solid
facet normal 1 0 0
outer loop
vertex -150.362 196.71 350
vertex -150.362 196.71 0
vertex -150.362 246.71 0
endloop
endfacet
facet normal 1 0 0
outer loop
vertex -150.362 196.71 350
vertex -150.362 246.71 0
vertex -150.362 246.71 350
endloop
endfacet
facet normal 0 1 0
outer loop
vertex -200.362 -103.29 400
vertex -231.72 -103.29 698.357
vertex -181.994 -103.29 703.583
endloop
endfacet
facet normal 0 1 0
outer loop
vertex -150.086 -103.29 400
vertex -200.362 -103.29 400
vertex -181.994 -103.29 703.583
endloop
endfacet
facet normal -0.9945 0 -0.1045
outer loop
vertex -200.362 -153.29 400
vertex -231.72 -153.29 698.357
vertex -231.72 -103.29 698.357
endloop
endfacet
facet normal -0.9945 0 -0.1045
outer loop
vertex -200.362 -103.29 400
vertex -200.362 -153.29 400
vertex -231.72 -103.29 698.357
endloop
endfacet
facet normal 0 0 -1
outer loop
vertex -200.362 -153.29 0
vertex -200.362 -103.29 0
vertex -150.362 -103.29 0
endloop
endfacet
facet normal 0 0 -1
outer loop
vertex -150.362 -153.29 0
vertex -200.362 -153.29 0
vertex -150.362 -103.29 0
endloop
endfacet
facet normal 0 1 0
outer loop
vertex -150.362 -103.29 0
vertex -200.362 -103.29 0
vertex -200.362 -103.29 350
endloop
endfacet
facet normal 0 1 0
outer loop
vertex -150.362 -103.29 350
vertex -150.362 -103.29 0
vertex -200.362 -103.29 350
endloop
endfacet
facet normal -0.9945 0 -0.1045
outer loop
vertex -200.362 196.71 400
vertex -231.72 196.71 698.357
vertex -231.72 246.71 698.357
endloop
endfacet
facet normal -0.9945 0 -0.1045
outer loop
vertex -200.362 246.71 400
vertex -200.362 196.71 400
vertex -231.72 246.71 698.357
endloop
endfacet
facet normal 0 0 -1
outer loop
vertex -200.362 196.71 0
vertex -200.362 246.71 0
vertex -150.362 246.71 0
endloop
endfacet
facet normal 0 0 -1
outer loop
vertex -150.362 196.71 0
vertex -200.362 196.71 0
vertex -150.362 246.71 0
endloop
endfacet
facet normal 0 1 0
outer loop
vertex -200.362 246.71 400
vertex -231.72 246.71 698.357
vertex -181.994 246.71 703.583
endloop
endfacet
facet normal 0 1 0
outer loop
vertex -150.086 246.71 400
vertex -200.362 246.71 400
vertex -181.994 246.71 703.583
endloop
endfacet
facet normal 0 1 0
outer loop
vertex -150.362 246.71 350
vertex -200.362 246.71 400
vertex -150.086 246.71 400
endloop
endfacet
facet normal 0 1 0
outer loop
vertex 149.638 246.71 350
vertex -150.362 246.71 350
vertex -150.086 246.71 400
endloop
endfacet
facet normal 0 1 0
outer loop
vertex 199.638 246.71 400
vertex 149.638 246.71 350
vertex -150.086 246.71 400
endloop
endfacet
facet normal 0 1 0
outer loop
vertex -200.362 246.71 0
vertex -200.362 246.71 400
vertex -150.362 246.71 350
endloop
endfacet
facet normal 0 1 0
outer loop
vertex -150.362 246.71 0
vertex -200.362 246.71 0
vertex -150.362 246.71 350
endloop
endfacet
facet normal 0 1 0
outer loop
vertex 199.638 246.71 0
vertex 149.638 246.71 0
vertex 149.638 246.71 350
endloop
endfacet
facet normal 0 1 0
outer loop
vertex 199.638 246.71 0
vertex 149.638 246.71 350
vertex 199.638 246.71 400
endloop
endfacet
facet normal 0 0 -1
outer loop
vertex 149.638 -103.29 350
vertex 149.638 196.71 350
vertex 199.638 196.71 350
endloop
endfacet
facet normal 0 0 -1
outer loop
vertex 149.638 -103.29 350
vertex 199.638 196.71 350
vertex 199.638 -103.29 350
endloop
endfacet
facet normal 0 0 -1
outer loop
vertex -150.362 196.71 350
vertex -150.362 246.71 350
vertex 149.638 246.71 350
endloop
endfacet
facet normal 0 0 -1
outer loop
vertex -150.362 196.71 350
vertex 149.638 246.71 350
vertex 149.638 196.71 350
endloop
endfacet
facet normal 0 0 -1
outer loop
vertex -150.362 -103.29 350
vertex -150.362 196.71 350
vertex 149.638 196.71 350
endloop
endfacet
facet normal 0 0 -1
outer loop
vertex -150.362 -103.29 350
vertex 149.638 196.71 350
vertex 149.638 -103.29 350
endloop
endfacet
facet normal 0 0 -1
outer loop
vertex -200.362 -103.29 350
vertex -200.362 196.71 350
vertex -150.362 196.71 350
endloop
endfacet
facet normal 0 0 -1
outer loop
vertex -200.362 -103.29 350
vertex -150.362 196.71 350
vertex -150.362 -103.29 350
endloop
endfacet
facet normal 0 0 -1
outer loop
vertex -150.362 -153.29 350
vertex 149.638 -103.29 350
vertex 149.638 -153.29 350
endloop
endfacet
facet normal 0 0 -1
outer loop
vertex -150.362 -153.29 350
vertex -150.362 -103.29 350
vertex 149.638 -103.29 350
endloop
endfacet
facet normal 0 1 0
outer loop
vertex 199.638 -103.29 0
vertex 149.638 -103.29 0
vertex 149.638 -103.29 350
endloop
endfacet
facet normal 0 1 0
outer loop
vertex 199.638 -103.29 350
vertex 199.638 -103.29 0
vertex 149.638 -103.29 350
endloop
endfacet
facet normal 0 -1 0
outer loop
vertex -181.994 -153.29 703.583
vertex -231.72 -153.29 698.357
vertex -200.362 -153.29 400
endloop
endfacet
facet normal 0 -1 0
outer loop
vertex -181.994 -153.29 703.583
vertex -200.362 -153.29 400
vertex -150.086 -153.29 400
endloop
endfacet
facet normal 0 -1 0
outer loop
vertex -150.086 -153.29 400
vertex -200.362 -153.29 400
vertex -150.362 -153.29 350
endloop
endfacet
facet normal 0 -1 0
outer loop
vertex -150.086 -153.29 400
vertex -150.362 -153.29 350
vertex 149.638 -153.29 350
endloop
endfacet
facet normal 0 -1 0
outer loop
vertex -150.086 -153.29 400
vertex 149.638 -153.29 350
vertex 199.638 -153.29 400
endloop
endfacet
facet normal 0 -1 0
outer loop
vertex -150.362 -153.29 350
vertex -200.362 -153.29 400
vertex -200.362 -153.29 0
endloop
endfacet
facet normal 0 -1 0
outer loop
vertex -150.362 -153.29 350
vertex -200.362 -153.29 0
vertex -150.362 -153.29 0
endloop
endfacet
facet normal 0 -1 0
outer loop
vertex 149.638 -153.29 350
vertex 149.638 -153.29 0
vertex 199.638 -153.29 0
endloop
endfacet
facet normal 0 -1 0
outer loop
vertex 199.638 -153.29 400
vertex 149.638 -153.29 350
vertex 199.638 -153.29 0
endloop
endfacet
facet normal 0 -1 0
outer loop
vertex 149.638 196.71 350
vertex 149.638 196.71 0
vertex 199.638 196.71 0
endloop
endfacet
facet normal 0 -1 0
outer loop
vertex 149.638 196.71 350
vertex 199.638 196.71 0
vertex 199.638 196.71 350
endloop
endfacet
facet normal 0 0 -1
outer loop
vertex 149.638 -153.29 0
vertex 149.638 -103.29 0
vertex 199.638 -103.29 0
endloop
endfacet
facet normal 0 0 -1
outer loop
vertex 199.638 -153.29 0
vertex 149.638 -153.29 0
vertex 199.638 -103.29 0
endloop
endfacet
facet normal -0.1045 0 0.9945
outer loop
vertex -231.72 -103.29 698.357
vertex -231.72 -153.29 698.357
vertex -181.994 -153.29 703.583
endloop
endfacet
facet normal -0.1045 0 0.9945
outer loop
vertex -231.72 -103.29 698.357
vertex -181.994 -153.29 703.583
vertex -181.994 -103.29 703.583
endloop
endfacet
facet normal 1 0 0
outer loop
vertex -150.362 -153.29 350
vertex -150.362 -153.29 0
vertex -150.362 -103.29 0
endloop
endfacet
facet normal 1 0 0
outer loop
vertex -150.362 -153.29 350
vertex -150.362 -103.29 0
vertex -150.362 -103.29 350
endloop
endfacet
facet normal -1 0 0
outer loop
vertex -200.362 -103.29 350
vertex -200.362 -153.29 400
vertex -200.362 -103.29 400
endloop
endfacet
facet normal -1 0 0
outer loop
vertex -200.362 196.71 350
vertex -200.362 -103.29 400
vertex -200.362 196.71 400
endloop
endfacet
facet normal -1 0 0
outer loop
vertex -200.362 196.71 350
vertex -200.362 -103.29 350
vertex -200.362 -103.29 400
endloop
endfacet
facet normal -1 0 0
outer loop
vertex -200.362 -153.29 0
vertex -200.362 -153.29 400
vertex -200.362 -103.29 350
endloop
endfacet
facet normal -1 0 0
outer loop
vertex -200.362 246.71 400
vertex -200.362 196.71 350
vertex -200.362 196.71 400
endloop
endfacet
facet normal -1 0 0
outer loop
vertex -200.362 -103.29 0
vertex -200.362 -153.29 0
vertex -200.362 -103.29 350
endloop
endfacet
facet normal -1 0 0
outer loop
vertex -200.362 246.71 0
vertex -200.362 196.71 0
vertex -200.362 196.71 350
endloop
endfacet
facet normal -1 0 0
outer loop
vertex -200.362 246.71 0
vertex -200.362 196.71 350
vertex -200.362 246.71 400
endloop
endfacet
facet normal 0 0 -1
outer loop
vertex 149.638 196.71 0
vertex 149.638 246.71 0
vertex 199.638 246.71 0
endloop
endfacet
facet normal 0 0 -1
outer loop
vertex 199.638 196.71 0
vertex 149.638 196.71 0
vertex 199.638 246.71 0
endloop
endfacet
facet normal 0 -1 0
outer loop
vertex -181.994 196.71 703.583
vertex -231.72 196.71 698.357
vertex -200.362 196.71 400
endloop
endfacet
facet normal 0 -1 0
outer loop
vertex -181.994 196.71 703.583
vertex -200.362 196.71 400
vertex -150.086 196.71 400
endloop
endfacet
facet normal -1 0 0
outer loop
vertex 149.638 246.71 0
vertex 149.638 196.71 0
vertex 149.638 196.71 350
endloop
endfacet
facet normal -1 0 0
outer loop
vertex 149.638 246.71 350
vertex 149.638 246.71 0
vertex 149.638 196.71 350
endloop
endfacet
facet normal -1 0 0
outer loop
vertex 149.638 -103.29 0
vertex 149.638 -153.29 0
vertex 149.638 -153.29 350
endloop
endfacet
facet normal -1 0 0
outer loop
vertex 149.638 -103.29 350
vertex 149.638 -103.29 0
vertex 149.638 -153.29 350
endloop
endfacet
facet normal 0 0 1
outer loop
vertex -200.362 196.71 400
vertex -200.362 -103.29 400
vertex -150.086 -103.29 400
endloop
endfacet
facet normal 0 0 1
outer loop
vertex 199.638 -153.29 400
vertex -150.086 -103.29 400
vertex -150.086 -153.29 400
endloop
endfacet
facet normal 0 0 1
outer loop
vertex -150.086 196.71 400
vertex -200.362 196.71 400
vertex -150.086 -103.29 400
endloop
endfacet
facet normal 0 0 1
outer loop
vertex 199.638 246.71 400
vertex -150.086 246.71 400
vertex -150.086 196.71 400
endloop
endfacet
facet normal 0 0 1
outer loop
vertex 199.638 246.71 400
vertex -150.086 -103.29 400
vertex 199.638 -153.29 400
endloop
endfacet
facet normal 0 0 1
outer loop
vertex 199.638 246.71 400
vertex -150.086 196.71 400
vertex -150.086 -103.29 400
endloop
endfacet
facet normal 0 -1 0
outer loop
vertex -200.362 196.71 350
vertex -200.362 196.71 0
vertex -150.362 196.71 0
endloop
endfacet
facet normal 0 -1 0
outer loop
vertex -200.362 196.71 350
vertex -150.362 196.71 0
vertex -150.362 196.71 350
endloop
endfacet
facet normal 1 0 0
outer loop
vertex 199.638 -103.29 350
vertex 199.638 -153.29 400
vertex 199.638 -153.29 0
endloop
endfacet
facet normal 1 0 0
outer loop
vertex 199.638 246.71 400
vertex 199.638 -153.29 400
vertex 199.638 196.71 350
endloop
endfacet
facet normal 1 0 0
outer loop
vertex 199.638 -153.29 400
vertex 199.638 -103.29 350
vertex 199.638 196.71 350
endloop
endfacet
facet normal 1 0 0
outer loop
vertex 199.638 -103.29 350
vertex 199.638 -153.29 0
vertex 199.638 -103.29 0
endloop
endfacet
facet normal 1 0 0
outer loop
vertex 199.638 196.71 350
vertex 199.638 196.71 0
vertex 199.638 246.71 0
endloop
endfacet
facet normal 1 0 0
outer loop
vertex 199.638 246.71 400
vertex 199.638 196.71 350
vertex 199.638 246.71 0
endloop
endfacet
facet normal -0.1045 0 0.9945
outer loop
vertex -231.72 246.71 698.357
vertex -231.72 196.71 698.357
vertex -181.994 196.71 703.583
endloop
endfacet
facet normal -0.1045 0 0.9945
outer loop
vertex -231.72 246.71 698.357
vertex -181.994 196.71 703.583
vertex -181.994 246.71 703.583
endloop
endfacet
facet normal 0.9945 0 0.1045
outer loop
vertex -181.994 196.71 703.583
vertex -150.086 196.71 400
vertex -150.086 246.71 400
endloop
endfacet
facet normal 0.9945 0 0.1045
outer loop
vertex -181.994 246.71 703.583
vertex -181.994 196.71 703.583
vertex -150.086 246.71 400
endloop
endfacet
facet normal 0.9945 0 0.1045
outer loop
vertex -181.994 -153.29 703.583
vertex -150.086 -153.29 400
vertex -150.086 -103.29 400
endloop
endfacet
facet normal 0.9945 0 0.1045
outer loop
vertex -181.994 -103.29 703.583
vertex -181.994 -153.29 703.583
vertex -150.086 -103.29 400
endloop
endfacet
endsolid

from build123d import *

# Parameters (mm, degrees)
F0_W      = 400
F0_H      = 400
F1_DEPTH  = 400
F2_W      = 300
F2_H      = 350
F3_DEPTH  = 400
F4_W      = 300
F4_H      = 350
F5_DEPTH  = 400
F6_W      = 50
F6_H      = 400
F7_DEPTH  = 300
F8_W      = 300
F8_H      = 300
F9_DEPTH  = 50
F10_DEPTH = 300
F11_DEPTH = 300
F15_W     = 50
F15_H     = 300
F16_DEPTH = 50
F17_DEPTH = 25
F18_W     = 50
F18_H     = 300
F19_DEPTH = 50
F20_DEPTH = 5.2552117633


with BuildPart() as f1:
    # F0 (on Top) → F1 (new body)
    with BuildSketch(Plane.XY):
        with Locations((-0.3617890179, 46.7100545251)):
            Rectangle(F0_W, F0_H)
    extrude(amount=F1_DEPTH)

    # F2 (on face) → F3 (cut)
    with BuildSketch(Plane(origin=(-200.3617890179, 0, 0), x_dir=(0, -1, 0), z_dir=(-1, 0, 0))):
        with Locations((-46.7100545251, 175)):
            Rectangle(F2_W, F2_H)
    extrude(amount=-F3_DEPTH, mode=Mode.SUBTRACT)

    # F4 (on face) → F5 (cut)
    with BuildSketch(Plane.XZ.offset(153.2899454749)):
        with Locations((-0.3617890179, 175)):
            Rectangle(F4_W, F4_H)
    extrude(amount=-F5_DEPTH, mode=Mode.SUBTRACT)

    # F6 (on face) → F7 (join)
    with BuildSketch(Plane.XY.offset(400)):
        with Locations((-175.3617890179, 46.7100545251)):
            Rectangle(F6_W, F6_H)
    extrude(amount=F7_DEPTH)

    # F8 (on face) → F9 (cut)
    with BuildSketch(Plane.YZ.offset(-150.3617890179)):
        with Locations((46.7100545251, 550)):
            Rectangle(F8_W, F8_H)
    extrude(amount=-F9_DEPTH, mode=Mode.SUBTRACT)

    # F10 (cut): a face of the model
    f10_faces = [f1.faces().sort_by_distance(p)[0] for p in [
        (-175.3617890179, -128.2899454749, 700),
    ]]
    extrude(f10_faces, amount=-F10_DEPTH, mode=Mode.SUBTRACT)

    # F11 (cut): a face of the model
    f11_faces = [f1.faces().sort_by_distance(p)[0] for p in [
        (-175.3617890179, 221.7100545251, 700),
    ]]
    extrude(f11_faces, amount=-F11_DEPTH, mode=Mode.SUBTRACT)

    # F15 (on face) → F16 (join)
    with BuildSketch(Plane(origin=(-156.5902579487, 0, -16.4582993118), x_dir=(0, 1, 0), z_dir=(0.9945218954, 0, 0.1045284633))):
        with Locations((-128.2899454749, 568.7522680509)):
            Rectangle(F15_W, F15_H)
    extrude(amount=F16_DEPTH)

    # F17 (add): a face of the model
    f17_faces = [f1.faces().sort_by_distance(p)[0] for p in [
        (-175.4987416337, -128.2899454749, 402.6132115817),
    ]]
    extrude(f17_faces, amount=F17_DEPTH)



with BuildPart() as f19:
    # F18 (on face) → F19 (new body)
    with BuildSketch(Plane(origin=(-156.5902579487, 0, -16.4582993118), x_dir=(0, 1, 0), z_dir=(0.9945218954, 0, 0.1045284633))):
        with Locations((221.7100545251, 568.7522680509)):
            Rectangle(F18_W, F18_H)
    extrude(amount=F19_DEPTH)


with BuildPart() as f1_1:
    add(f1.part)
    # F20 (add, through all): a face of the model
    f20_faces = [f19.part.faces().sort_by_distance(p)[0] for p in [
        (-175.4987416337, 221.7100545251, 402.6132115817),
    ]]

    add(f19.part)  # F20 merges F19
    extrude(f20_faces, amount=F20_DEPTH)


solid = f1_1.part
